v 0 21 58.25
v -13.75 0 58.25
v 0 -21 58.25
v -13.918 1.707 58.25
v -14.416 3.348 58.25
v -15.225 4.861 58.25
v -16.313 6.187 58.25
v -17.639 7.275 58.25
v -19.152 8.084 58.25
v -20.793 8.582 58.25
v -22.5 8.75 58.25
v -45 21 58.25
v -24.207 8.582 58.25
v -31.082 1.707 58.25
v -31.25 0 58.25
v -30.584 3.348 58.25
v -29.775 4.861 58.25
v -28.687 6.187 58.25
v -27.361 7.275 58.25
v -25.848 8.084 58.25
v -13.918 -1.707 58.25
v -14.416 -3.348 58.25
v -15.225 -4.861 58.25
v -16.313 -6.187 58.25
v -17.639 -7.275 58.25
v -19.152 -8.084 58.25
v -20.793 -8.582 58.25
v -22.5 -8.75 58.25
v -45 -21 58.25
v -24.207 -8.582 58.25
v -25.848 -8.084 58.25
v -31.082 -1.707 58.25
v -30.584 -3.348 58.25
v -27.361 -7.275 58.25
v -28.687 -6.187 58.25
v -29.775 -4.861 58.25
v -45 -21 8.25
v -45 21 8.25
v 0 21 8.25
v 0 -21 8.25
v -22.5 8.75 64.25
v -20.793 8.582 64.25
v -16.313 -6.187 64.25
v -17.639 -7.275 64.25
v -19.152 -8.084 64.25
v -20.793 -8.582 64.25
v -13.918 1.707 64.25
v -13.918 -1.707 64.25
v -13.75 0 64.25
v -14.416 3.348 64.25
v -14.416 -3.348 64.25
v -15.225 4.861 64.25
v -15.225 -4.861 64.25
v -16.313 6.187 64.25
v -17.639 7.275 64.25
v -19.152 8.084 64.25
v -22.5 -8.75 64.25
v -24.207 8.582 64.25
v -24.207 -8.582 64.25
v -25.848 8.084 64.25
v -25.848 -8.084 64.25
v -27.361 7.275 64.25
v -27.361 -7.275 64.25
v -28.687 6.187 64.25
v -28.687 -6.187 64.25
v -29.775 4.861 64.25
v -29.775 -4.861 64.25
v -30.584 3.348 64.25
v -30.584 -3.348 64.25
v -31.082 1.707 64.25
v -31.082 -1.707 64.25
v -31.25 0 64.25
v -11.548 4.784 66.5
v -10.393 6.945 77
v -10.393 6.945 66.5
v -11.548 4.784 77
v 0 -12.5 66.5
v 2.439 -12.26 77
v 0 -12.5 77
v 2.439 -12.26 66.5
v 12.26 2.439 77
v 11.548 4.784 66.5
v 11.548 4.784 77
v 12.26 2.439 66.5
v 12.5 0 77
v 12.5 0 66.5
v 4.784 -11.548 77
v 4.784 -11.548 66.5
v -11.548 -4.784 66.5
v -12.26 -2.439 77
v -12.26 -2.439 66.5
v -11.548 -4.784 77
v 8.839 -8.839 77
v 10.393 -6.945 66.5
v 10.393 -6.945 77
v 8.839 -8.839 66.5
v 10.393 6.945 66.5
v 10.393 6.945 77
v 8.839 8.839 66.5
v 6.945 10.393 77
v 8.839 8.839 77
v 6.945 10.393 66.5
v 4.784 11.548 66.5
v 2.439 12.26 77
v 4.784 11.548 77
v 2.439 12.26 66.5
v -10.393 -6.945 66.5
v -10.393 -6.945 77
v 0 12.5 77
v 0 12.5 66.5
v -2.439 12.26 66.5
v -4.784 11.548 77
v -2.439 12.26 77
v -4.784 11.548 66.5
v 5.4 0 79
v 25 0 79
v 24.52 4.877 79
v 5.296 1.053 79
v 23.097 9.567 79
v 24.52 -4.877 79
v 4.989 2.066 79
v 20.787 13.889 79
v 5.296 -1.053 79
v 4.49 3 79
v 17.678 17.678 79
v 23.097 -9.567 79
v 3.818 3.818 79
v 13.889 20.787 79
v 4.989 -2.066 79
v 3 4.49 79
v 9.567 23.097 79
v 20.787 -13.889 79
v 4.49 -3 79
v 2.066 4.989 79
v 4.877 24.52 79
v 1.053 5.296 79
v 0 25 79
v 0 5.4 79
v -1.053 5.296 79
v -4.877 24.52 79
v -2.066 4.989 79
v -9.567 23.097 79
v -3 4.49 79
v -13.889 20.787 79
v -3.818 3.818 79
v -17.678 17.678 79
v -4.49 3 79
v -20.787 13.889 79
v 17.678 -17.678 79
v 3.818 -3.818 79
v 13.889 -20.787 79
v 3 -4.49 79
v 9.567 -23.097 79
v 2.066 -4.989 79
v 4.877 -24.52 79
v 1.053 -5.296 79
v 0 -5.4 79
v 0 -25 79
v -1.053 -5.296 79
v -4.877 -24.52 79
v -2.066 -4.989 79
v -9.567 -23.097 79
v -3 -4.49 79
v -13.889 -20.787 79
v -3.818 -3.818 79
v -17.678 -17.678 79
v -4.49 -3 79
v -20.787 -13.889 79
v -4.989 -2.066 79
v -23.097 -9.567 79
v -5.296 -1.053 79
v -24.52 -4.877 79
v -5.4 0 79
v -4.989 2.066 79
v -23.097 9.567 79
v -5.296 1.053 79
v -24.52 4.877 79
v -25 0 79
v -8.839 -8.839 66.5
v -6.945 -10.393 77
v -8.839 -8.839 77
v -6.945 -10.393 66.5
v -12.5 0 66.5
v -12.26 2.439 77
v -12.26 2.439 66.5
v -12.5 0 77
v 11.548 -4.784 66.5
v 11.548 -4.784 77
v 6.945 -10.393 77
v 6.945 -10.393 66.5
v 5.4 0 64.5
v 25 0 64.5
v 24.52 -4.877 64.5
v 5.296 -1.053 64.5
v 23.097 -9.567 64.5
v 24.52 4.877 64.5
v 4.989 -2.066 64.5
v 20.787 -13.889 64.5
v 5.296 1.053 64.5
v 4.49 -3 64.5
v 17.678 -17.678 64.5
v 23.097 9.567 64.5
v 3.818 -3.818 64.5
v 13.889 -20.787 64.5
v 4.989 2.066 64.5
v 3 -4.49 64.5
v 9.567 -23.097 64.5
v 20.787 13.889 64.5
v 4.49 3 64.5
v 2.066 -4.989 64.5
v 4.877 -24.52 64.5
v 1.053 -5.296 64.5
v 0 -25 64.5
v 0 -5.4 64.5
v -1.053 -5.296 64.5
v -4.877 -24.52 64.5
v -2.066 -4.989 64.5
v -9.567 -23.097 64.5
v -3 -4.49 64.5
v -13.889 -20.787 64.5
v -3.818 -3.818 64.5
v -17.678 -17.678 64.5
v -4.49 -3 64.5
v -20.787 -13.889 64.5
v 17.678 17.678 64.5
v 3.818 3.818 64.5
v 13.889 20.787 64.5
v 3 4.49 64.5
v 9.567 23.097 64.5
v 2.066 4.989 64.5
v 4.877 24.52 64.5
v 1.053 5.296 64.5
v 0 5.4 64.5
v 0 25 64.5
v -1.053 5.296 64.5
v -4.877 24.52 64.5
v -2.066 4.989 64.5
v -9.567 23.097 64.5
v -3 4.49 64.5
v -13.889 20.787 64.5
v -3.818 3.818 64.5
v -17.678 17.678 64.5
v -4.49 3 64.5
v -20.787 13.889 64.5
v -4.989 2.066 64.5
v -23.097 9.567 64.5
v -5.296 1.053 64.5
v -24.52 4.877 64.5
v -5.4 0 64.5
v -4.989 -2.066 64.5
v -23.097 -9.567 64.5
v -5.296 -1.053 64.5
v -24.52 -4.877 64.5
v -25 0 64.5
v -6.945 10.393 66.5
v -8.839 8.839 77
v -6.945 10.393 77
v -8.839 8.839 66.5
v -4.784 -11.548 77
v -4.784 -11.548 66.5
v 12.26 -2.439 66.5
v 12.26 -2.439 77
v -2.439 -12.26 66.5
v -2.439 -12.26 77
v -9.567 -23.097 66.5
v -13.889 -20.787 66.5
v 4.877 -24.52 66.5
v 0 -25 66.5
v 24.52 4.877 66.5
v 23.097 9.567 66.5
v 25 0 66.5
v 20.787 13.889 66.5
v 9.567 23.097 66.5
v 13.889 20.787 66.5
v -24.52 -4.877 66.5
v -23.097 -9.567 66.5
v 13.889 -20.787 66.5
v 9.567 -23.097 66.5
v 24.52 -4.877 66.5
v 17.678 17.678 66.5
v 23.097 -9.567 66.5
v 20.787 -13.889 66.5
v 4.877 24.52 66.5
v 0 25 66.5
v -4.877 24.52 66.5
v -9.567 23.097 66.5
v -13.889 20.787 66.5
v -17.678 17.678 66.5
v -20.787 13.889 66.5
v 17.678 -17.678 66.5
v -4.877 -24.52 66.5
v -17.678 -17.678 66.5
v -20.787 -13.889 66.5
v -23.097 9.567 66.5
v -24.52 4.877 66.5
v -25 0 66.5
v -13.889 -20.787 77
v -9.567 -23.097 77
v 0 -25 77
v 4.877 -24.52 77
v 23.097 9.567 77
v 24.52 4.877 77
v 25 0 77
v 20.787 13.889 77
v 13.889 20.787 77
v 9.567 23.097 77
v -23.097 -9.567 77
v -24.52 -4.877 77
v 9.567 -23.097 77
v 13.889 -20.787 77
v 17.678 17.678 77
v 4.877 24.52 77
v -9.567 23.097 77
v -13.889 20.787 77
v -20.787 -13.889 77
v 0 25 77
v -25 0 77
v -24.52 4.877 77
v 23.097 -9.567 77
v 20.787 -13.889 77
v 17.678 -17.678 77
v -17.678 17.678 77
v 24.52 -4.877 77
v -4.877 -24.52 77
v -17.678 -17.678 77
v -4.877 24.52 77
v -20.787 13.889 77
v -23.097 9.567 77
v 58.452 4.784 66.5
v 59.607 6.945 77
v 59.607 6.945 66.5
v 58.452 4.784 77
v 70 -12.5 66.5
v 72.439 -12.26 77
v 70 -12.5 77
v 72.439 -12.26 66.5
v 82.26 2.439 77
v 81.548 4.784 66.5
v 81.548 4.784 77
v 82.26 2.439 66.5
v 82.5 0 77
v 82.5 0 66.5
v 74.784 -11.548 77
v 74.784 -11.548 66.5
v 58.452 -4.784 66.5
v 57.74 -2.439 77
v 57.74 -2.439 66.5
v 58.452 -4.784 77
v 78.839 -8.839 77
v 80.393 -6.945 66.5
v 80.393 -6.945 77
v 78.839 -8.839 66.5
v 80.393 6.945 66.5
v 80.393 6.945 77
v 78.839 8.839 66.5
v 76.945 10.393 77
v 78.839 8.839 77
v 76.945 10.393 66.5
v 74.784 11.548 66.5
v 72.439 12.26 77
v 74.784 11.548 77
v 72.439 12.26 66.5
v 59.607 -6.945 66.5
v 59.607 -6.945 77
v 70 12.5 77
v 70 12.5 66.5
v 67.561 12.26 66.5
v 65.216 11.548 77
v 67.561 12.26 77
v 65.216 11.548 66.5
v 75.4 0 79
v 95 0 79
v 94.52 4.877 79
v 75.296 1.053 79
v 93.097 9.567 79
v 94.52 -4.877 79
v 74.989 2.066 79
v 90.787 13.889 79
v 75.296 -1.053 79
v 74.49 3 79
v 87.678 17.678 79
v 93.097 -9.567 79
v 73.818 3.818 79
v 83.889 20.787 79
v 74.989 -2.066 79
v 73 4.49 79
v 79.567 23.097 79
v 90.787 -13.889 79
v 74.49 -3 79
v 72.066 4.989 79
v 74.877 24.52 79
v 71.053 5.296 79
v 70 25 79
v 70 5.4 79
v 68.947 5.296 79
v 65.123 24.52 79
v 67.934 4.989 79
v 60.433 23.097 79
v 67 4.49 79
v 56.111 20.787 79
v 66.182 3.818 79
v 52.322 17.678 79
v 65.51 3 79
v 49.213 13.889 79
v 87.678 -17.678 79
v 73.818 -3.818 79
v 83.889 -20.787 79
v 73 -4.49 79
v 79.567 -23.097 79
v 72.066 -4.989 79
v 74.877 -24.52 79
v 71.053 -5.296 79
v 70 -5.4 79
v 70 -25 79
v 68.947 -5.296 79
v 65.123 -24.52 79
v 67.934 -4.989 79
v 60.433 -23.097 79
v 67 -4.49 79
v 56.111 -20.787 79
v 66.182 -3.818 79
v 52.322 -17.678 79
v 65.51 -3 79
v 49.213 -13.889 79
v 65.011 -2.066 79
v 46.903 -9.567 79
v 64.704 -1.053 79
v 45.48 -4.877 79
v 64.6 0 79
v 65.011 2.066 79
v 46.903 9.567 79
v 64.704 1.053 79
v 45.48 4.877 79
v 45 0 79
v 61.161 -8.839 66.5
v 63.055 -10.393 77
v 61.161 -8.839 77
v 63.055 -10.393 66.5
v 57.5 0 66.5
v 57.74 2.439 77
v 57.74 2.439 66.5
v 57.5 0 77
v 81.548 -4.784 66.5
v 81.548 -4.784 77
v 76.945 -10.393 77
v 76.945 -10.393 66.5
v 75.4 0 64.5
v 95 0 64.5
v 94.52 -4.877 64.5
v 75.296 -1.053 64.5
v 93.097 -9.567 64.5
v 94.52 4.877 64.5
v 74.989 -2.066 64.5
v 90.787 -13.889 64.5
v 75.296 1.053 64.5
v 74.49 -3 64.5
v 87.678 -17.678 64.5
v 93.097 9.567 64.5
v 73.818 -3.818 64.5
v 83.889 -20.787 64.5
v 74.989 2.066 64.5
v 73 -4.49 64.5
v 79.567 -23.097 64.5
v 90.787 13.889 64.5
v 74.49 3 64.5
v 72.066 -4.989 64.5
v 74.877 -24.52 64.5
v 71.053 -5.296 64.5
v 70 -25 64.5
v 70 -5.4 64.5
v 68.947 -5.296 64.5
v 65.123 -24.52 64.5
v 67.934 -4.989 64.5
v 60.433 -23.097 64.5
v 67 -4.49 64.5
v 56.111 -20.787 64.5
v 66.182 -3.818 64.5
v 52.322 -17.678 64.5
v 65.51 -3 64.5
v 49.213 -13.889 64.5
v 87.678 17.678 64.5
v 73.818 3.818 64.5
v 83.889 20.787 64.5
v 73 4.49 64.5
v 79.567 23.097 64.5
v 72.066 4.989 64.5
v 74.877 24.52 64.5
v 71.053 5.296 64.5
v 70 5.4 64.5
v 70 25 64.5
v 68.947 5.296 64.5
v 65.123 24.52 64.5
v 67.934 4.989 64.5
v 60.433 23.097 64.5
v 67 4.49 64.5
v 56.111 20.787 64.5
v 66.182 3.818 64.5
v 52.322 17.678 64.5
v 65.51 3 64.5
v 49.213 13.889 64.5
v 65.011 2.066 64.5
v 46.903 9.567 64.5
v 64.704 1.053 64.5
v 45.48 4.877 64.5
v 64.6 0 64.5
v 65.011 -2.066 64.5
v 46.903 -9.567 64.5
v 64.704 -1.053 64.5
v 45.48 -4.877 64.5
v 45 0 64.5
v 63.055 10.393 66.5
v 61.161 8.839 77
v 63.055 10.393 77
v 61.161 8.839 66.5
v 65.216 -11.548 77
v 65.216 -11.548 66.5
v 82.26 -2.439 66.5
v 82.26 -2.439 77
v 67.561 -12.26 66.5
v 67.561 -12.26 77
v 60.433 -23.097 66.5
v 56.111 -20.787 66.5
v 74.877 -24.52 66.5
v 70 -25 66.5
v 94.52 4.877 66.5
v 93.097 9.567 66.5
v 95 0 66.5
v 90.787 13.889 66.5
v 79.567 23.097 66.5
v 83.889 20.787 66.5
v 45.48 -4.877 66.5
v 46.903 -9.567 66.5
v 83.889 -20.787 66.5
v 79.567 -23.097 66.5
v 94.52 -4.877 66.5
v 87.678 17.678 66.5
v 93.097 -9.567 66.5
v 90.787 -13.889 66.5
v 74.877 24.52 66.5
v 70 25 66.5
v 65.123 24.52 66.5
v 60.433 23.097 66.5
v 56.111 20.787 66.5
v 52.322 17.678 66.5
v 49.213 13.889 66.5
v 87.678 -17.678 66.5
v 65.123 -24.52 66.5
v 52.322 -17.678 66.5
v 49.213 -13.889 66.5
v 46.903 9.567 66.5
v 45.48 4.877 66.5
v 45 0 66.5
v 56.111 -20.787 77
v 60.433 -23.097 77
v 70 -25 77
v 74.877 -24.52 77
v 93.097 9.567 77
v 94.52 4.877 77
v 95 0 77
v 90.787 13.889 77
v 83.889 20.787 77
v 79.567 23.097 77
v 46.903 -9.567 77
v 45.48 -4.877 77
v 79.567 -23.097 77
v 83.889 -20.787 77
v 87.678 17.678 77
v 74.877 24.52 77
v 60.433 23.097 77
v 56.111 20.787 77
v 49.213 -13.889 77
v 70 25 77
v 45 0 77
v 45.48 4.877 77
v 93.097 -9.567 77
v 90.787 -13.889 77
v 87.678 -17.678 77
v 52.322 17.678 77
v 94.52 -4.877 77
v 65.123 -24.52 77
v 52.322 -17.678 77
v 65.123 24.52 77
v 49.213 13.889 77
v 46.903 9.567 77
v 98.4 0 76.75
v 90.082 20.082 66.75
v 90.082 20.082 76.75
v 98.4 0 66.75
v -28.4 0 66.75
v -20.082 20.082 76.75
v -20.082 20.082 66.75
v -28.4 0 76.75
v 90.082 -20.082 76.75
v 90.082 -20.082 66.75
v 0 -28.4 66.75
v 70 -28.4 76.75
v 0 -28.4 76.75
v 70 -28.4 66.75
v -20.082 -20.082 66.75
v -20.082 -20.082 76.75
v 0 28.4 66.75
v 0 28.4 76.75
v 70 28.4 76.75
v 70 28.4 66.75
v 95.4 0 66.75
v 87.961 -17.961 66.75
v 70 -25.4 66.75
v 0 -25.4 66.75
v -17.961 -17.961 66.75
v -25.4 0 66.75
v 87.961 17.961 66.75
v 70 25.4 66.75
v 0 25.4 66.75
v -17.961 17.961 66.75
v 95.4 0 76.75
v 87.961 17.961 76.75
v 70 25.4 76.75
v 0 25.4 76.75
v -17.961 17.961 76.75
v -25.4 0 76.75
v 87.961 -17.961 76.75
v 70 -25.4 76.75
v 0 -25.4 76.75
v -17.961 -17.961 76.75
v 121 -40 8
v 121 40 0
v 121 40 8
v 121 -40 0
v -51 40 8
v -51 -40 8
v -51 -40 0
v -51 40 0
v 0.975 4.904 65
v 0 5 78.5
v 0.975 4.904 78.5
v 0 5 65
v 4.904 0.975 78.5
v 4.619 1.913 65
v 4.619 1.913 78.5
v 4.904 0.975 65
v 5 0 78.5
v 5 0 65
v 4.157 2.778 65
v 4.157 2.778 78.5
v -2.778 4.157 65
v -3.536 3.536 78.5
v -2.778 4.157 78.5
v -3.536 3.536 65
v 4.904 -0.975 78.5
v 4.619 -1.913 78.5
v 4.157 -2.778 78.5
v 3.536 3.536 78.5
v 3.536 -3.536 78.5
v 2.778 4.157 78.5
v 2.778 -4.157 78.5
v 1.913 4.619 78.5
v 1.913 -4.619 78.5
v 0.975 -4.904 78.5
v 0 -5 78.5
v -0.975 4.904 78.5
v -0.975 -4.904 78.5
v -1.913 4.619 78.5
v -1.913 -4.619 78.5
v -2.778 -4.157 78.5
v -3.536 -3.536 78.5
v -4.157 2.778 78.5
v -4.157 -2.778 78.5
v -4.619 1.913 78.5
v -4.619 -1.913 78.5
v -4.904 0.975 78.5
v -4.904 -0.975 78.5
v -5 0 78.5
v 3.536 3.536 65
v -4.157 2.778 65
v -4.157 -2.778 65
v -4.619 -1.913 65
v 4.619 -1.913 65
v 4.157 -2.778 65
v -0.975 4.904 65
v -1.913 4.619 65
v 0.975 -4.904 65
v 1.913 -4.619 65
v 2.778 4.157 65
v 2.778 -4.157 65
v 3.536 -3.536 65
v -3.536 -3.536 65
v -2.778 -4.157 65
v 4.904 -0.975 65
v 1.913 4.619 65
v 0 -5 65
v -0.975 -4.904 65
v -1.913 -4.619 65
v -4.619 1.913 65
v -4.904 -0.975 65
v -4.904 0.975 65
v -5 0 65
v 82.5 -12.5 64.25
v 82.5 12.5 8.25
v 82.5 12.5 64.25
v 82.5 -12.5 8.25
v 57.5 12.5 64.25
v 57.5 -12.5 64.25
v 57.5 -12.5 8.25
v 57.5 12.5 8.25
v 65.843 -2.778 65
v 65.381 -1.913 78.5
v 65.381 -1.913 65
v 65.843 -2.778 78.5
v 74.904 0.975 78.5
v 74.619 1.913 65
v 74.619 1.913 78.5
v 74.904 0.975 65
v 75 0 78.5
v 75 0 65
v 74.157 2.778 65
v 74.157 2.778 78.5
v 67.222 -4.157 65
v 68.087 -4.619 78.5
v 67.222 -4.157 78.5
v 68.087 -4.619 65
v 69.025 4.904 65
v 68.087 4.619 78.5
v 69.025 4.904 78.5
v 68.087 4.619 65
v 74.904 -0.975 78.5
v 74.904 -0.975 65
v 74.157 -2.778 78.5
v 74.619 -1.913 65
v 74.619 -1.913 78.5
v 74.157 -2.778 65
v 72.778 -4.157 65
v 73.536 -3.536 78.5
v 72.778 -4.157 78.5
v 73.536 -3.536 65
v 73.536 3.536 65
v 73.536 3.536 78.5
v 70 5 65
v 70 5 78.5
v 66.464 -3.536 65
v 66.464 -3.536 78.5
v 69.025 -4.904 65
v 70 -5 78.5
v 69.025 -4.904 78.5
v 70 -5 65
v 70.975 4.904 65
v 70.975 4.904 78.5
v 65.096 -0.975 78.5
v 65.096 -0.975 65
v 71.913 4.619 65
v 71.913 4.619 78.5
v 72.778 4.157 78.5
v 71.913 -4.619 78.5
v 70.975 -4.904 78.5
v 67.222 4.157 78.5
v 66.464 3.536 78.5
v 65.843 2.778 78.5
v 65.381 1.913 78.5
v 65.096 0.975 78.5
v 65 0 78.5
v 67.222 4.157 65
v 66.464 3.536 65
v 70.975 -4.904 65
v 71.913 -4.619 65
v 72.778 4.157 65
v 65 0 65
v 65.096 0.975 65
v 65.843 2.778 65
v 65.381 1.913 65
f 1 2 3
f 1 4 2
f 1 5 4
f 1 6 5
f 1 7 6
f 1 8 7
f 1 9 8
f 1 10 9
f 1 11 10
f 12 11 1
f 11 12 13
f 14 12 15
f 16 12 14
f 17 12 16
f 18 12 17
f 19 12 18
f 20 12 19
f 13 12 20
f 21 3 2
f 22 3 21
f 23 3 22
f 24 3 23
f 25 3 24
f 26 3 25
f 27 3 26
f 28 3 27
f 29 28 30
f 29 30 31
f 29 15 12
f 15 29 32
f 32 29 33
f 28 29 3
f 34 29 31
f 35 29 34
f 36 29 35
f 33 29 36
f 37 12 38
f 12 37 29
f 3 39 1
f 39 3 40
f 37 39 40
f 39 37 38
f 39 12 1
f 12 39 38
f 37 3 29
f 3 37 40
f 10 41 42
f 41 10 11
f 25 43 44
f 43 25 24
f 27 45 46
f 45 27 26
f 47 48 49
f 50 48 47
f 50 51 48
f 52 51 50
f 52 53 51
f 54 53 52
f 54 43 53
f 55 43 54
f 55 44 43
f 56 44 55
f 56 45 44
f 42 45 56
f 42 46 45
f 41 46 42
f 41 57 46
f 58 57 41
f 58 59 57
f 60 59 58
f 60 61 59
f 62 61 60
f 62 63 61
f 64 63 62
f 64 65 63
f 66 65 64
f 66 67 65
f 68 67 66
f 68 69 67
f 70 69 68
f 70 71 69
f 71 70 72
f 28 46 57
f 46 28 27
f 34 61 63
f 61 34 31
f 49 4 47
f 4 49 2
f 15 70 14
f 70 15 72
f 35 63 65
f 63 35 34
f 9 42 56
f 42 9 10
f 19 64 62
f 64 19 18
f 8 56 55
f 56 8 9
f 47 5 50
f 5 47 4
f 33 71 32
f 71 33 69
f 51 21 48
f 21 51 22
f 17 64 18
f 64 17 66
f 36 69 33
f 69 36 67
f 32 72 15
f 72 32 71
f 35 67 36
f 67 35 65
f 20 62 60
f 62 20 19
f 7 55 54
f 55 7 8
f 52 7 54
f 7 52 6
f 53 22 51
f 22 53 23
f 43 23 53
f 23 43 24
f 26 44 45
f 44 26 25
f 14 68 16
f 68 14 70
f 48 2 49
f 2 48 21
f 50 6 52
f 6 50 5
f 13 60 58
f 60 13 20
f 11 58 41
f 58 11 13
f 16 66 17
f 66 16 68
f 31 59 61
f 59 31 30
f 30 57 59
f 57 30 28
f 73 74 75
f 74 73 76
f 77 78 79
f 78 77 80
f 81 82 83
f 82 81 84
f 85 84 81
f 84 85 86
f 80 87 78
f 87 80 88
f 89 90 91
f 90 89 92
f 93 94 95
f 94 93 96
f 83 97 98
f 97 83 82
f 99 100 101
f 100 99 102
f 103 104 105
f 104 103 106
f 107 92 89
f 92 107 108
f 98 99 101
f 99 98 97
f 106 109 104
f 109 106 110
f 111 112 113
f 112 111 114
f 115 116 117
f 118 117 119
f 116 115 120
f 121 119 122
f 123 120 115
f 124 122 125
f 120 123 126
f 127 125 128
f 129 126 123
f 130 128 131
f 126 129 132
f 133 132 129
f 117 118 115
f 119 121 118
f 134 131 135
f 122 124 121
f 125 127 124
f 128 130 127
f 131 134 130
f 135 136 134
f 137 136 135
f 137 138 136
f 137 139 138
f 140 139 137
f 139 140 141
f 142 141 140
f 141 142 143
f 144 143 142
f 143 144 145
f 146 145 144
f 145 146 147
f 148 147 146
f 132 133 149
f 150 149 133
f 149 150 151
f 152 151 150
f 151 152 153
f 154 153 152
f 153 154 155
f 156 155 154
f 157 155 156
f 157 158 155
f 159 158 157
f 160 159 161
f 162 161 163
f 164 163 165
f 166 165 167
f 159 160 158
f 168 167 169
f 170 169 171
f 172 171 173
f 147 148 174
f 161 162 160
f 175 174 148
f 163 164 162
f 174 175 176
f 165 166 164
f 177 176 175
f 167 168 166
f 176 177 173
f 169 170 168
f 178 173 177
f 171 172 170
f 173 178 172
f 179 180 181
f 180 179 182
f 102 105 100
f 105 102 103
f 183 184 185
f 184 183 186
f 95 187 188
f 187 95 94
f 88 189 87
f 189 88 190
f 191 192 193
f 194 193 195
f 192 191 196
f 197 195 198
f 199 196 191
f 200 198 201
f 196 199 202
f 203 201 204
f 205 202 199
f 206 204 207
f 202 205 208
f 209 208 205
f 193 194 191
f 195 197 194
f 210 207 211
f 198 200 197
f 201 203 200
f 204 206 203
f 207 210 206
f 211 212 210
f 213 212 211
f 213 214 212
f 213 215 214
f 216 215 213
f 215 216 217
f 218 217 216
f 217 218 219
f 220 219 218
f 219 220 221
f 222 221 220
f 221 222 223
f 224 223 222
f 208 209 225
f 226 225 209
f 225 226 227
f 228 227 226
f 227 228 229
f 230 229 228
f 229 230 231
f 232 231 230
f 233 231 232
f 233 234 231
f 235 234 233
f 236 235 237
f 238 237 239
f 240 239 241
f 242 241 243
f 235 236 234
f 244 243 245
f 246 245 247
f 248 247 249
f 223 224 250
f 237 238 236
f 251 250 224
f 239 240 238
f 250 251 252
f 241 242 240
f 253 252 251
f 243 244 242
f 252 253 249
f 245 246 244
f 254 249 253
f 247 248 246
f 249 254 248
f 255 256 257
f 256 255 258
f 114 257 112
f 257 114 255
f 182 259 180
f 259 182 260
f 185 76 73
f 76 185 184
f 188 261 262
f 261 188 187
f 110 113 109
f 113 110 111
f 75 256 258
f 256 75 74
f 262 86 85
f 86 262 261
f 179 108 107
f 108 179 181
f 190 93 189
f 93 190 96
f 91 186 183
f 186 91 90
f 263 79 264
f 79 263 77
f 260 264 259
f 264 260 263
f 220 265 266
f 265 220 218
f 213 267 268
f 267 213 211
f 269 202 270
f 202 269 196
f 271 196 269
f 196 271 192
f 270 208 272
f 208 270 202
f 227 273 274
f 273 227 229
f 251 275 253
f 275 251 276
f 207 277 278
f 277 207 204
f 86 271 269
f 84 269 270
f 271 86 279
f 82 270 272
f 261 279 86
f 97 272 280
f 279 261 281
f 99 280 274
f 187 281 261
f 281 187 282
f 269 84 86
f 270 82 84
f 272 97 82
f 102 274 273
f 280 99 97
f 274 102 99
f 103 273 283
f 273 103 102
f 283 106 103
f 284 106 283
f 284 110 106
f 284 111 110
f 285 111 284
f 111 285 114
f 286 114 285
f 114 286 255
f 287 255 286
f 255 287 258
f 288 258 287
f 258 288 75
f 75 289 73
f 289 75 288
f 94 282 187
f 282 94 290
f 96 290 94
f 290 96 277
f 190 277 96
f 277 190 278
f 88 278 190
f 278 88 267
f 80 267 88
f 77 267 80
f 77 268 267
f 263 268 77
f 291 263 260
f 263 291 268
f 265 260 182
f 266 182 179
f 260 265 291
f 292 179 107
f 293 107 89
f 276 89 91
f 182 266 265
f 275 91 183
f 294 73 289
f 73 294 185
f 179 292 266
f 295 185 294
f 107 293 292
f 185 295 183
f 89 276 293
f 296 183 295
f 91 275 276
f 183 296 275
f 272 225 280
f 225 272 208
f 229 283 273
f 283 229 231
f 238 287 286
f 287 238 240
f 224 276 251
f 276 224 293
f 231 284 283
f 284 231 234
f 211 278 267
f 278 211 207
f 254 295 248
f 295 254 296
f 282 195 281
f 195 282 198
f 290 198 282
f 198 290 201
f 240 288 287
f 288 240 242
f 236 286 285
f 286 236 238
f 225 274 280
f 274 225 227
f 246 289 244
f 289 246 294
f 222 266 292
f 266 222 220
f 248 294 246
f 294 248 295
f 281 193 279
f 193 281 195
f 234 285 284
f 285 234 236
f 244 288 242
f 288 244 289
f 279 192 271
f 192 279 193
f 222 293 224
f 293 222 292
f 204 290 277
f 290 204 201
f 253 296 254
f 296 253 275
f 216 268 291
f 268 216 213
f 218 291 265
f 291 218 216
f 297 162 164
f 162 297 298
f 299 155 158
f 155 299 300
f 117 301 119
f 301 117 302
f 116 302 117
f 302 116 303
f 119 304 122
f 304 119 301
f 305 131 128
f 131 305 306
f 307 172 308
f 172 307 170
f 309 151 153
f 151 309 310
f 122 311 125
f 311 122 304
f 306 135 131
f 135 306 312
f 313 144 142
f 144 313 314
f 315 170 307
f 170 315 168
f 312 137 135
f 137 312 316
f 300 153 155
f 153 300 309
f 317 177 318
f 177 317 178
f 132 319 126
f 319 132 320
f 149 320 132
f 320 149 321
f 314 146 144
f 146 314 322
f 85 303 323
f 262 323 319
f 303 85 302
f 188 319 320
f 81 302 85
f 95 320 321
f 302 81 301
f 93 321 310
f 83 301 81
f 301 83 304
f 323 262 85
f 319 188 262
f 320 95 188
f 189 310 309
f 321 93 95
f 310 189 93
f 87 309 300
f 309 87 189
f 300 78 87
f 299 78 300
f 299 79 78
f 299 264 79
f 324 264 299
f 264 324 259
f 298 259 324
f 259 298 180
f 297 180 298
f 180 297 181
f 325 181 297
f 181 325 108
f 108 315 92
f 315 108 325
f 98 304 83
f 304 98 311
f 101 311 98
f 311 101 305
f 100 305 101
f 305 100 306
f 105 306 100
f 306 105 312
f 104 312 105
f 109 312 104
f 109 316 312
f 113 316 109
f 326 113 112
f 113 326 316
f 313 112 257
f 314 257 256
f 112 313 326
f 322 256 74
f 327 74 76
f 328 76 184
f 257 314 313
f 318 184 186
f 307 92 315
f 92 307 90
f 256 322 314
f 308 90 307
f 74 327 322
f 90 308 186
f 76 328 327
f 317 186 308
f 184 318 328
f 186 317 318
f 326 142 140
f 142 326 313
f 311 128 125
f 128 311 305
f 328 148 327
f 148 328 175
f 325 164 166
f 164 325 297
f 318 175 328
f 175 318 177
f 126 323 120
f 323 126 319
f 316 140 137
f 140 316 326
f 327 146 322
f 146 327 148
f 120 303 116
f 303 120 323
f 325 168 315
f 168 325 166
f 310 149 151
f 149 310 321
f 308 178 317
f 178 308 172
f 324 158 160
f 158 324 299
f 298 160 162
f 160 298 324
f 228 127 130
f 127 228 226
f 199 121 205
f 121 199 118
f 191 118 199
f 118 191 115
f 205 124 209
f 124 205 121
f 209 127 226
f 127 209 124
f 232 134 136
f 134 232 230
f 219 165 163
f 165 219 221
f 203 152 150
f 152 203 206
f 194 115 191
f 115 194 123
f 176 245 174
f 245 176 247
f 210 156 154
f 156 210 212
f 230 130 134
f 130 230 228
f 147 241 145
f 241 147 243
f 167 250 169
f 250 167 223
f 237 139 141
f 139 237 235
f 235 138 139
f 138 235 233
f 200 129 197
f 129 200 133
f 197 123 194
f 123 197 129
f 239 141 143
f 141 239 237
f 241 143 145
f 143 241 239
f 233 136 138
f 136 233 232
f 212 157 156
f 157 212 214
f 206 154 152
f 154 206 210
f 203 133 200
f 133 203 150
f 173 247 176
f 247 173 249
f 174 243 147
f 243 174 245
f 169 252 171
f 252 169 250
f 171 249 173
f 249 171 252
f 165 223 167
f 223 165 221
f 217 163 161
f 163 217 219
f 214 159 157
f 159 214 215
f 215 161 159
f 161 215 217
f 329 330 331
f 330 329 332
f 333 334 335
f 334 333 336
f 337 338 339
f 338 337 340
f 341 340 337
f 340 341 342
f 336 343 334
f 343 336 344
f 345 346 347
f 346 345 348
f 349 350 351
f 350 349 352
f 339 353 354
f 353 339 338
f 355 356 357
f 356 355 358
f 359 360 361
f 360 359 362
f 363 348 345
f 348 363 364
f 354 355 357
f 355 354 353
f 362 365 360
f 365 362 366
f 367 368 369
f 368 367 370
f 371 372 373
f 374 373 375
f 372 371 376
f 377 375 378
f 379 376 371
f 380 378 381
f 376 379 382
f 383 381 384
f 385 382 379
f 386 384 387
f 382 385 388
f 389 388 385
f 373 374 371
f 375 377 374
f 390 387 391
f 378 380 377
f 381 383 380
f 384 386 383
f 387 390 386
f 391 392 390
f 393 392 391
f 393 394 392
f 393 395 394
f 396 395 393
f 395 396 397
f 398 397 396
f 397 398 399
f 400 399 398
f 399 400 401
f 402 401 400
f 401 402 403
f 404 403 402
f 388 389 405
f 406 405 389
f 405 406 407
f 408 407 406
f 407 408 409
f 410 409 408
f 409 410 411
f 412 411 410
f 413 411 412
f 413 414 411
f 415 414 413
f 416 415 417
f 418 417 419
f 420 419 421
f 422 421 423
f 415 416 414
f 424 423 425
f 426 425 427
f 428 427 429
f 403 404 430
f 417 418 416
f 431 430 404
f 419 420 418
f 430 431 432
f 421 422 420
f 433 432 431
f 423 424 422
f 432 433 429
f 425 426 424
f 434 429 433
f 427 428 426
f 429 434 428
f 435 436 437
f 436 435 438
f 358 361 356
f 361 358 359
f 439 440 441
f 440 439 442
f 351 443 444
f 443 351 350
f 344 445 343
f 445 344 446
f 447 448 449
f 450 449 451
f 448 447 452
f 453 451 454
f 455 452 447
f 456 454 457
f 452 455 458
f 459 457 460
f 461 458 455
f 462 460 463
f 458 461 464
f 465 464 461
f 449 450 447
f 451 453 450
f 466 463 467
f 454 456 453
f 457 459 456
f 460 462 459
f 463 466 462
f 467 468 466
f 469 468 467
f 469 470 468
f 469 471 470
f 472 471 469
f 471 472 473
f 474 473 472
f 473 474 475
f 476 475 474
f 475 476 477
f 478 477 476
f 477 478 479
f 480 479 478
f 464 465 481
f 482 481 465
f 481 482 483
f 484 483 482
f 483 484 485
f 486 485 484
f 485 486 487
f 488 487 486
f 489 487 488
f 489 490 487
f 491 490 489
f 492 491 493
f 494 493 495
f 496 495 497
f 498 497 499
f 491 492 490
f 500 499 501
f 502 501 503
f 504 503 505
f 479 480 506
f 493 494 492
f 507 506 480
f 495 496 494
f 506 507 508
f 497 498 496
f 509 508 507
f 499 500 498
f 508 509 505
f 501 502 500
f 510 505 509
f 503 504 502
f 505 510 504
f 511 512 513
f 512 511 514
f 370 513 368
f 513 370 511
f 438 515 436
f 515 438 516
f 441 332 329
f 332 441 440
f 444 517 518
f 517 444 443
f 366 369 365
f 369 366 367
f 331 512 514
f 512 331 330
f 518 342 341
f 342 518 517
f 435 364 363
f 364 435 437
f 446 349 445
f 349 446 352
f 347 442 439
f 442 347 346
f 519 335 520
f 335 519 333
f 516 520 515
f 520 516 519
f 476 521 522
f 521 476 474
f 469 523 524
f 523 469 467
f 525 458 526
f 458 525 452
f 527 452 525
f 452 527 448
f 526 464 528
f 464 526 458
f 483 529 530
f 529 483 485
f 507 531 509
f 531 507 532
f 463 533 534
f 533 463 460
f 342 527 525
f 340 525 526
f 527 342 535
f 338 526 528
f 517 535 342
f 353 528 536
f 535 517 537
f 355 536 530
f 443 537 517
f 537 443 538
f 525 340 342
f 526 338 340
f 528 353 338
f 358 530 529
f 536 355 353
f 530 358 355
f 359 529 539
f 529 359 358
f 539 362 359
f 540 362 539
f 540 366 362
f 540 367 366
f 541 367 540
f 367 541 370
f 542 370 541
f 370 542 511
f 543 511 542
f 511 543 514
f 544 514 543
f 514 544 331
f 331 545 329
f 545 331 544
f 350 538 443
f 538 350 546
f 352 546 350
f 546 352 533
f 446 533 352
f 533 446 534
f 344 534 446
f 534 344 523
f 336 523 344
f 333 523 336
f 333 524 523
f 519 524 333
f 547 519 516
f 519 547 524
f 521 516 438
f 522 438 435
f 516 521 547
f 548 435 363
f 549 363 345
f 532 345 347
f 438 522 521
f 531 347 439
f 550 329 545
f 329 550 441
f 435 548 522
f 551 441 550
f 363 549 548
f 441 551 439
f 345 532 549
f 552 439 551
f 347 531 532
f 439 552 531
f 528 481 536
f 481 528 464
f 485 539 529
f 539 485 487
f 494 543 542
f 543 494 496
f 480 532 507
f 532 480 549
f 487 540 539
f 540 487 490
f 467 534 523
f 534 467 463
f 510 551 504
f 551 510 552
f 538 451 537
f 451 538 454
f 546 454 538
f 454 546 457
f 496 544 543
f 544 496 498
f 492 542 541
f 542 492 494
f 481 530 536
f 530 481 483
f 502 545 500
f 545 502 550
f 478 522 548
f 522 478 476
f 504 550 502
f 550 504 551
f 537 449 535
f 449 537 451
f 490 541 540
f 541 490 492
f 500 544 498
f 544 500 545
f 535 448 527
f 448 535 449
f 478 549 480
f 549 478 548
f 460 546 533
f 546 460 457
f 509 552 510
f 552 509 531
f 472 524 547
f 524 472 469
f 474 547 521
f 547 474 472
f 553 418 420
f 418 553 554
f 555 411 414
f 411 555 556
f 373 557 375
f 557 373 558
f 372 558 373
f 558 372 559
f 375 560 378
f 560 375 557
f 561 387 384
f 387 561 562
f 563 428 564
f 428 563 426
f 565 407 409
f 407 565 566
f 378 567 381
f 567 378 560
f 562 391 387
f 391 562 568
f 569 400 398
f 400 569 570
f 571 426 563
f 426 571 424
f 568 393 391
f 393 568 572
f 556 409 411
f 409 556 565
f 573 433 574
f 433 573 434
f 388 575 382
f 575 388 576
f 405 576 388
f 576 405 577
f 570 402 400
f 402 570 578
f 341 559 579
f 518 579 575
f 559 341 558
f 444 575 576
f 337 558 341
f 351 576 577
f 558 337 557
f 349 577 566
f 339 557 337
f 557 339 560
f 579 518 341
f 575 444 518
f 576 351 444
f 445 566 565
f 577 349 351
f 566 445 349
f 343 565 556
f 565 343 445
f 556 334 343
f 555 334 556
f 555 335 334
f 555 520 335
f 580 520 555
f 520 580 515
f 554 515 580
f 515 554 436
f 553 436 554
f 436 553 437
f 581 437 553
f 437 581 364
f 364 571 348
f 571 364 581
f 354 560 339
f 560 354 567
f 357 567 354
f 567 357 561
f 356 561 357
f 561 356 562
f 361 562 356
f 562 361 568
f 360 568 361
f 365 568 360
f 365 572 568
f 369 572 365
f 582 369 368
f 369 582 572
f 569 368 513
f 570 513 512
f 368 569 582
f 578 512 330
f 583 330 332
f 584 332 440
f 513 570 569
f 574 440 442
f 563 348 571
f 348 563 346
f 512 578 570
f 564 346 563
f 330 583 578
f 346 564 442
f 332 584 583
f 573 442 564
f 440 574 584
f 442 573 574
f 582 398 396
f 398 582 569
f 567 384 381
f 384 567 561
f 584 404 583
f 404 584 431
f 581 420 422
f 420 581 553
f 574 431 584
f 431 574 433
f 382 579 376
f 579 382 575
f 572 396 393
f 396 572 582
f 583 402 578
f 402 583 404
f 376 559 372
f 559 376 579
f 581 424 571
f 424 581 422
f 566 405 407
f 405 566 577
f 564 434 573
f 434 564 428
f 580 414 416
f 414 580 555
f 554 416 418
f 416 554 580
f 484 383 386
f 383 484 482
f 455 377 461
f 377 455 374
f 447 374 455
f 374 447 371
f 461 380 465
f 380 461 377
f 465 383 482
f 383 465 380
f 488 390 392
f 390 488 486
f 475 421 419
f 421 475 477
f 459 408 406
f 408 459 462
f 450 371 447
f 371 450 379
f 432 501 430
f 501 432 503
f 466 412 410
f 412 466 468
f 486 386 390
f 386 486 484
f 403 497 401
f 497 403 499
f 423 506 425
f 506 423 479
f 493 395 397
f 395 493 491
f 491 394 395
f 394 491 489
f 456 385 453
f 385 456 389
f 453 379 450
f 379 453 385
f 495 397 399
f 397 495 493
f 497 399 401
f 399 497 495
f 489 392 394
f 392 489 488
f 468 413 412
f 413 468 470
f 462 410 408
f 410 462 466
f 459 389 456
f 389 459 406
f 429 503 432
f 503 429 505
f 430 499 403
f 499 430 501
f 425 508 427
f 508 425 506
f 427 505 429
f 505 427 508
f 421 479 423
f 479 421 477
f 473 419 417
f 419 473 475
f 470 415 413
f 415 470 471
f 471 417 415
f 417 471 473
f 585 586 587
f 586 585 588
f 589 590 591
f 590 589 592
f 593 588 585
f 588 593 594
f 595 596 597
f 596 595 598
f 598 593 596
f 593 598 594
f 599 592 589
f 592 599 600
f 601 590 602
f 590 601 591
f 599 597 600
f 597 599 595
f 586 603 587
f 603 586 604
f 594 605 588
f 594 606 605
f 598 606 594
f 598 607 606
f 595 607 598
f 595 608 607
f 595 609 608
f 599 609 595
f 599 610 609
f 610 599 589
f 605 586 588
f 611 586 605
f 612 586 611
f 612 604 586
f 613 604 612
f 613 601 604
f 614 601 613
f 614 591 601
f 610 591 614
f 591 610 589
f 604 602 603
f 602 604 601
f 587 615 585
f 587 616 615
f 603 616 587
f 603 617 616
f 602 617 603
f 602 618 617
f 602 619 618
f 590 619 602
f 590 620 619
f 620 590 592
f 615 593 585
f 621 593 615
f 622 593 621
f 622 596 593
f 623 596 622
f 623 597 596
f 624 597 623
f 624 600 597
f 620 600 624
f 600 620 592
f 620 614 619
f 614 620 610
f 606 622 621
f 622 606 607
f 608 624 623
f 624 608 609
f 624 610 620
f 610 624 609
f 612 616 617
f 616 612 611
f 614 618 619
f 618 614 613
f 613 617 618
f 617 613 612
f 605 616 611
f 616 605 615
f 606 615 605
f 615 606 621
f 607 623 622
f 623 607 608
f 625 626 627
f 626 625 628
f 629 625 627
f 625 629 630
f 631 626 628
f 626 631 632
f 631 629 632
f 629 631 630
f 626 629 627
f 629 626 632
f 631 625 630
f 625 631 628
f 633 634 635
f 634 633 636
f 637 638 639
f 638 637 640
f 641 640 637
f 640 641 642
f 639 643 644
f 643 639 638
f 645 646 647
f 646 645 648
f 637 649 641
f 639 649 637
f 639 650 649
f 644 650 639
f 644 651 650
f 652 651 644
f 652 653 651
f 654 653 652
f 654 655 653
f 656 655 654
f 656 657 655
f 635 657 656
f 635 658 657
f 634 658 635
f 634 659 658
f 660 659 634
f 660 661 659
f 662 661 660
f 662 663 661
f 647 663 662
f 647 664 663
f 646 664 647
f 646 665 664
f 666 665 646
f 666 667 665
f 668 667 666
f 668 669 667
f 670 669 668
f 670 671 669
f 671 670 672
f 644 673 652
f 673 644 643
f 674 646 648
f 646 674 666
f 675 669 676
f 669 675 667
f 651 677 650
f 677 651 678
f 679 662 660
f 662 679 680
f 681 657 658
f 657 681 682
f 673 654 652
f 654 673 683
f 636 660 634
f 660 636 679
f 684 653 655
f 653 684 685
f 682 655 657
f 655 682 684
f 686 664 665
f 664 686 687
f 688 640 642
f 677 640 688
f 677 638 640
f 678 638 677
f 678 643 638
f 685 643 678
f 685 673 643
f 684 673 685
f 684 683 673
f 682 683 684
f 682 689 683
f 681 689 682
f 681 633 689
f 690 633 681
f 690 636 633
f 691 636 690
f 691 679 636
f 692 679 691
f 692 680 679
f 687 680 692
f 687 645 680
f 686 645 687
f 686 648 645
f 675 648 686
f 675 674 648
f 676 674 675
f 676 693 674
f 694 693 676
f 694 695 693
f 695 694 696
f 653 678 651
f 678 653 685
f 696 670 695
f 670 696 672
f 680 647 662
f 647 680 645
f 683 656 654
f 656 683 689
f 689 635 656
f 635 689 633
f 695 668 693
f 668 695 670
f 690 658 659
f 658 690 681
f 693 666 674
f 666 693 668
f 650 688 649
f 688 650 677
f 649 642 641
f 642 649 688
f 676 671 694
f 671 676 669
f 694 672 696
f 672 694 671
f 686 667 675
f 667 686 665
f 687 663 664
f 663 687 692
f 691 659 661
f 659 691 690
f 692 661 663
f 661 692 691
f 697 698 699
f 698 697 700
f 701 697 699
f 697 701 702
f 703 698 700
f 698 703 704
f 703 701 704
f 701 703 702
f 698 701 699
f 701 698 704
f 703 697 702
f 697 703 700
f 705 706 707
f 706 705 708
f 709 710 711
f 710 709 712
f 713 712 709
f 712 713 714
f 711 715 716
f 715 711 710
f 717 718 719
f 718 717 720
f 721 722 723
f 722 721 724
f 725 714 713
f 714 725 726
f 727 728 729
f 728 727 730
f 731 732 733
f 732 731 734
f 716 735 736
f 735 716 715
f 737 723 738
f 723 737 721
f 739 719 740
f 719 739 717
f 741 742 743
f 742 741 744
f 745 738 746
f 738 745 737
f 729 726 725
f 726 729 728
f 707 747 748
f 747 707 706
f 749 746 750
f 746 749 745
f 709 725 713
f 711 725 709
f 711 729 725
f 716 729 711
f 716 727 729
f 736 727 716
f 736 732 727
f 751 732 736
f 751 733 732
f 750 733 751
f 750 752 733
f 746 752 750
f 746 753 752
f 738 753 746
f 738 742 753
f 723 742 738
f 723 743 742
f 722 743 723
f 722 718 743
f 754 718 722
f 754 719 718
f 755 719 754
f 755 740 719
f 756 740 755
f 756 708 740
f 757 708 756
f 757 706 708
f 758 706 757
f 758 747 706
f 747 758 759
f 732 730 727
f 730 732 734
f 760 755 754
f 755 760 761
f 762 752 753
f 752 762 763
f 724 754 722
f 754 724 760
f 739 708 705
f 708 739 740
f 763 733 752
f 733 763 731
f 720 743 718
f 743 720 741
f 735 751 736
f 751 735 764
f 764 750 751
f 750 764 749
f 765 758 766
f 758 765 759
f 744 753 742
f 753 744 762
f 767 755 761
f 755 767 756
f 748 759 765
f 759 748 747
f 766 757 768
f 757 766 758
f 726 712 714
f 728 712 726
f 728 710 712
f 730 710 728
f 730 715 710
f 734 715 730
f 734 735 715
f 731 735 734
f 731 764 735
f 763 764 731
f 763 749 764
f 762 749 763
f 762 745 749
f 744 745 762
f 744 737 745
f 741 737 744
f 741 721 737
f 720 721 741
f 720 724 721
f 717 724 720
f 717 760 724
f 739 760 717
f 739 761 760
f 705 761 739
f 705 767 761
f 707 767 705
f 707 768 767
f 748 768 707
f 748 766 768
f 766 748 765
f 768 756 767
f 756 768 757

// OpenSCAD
$fn = 32;

// ------------------------------------------------------------------------
// Motor belt drive: span 70 mm, pulleys d50, belt 10 mm wide
// Every part is its own module, assembly() places every instance.
// ------------------------------------------------------------------------

// --- part 1 ---
module base_plate() {
  difference() {
    translate([-86, -40, 0]) cube([172, 80, 8]);
  }
}

// --- part 2 ---
module motor() {
  union() {
    translate([-25, -21, 0]) cube([50, 42, 45]);
    translate([28, 0, 22.5]) rotate([0, 90, 0]) cylinder(h = 6, d = 17.5, center = true);
  }
}

// --- part 3 ---
module drive_shaft() {
  translate([0, 0, -6.75]) cylinder(h = 13.5, d = 10);
}

// --- part 4 ---
module pulley_drive() {
  difference() {
    union() {
      cylinder(h = 14.5, d = 25);
      cylinder(h = 2, d = 50);
      translate([0, 0, 12.5]) cylinder(h = 2, d = 50);
    }
    translate([0, 0, -1]) cylinder(h = 16.5, d = 10.8);
  }
}

// --- part 5 ---
module idler_post() {
  translate([-12.5, -12.5, 0]) cube([25, 25, 56]);
}

// --- part 6 ---
module driven_shaft() {
  translate([0, 0, -6.75]) cylinder(h = 13.5, d = 10);
}

// --- part 7 ---
module pulley_driven() {
  difference() {
    union() {
      cylinder(h = 14.5, d = 25);
      cylinder(h = 2, d = 50);
      translate([0, 0, 12.5]) cylinder(h = 2, d = 50);
    }
    translate([0, 0, -1]) cylinder(h = 16.5, d = 10.8);
  }
}

// --- part 8 ---
module drive_belt() {
  difference() {
    linear_extrude(height = 10) polygon(points = concat([for (a = [90 : 45 : 270]) [28.4 * cos(a), 28.4 * sin(a)]], [for (a = [270 : 45 : 450]) [70 + 28.4 * cos(a), 28.4 * sin(a)]]));
    translate([0, 0, -1]) linear_extrude(height = 12) polygon(points = concat([for (a = [90 : 45 : 270]) [25.4 * cos(a), 25.4 * sin(a)]], [for (a = [270 : 45 : 450]) [70 + 25.4 * cos(a), 25.4 * sin(a)]]));
  }
}

// --- assembly ---
module assembly() {
  color([0.80, 0.24, 0.20]) translate([35, 0, 0]) rotate([0, 0, 0]) base_plate();
  color([0.20, 0.45, 0.75]) translate([0, 0, 33.25]) rotate([0, 270, 0]) motor();
  color([0.25, 0.62, 0.32]) translate([0, 0, 71.75]) rotate([0, 0, 0]) drive_shaft();
  color([0.92, 0.70, 0.18]) translate([0, 0, 64.5]) rotate([0, 0, 0]) pulley_drive();
  color([0.58, 0.35, 0.70]) translate([70, 0, 8.25]) rotate([0, 0, 0]) idler_post();
  color([0.16, 0.66, 0.66]) translate([70, 0, 71.75]) rotate([0, 0, 0]) driven_shaft();
  color([0.85, 0.48, 0.18]) translate([70, 0, 64.5]) rotate([0, 0, 0]) pulley_driven();
  color([0.55, 0.60, 0.65]) translate([0, 0, 66.75]) rotate([0, 0, 0]) drive_belt();
}

assembly();
